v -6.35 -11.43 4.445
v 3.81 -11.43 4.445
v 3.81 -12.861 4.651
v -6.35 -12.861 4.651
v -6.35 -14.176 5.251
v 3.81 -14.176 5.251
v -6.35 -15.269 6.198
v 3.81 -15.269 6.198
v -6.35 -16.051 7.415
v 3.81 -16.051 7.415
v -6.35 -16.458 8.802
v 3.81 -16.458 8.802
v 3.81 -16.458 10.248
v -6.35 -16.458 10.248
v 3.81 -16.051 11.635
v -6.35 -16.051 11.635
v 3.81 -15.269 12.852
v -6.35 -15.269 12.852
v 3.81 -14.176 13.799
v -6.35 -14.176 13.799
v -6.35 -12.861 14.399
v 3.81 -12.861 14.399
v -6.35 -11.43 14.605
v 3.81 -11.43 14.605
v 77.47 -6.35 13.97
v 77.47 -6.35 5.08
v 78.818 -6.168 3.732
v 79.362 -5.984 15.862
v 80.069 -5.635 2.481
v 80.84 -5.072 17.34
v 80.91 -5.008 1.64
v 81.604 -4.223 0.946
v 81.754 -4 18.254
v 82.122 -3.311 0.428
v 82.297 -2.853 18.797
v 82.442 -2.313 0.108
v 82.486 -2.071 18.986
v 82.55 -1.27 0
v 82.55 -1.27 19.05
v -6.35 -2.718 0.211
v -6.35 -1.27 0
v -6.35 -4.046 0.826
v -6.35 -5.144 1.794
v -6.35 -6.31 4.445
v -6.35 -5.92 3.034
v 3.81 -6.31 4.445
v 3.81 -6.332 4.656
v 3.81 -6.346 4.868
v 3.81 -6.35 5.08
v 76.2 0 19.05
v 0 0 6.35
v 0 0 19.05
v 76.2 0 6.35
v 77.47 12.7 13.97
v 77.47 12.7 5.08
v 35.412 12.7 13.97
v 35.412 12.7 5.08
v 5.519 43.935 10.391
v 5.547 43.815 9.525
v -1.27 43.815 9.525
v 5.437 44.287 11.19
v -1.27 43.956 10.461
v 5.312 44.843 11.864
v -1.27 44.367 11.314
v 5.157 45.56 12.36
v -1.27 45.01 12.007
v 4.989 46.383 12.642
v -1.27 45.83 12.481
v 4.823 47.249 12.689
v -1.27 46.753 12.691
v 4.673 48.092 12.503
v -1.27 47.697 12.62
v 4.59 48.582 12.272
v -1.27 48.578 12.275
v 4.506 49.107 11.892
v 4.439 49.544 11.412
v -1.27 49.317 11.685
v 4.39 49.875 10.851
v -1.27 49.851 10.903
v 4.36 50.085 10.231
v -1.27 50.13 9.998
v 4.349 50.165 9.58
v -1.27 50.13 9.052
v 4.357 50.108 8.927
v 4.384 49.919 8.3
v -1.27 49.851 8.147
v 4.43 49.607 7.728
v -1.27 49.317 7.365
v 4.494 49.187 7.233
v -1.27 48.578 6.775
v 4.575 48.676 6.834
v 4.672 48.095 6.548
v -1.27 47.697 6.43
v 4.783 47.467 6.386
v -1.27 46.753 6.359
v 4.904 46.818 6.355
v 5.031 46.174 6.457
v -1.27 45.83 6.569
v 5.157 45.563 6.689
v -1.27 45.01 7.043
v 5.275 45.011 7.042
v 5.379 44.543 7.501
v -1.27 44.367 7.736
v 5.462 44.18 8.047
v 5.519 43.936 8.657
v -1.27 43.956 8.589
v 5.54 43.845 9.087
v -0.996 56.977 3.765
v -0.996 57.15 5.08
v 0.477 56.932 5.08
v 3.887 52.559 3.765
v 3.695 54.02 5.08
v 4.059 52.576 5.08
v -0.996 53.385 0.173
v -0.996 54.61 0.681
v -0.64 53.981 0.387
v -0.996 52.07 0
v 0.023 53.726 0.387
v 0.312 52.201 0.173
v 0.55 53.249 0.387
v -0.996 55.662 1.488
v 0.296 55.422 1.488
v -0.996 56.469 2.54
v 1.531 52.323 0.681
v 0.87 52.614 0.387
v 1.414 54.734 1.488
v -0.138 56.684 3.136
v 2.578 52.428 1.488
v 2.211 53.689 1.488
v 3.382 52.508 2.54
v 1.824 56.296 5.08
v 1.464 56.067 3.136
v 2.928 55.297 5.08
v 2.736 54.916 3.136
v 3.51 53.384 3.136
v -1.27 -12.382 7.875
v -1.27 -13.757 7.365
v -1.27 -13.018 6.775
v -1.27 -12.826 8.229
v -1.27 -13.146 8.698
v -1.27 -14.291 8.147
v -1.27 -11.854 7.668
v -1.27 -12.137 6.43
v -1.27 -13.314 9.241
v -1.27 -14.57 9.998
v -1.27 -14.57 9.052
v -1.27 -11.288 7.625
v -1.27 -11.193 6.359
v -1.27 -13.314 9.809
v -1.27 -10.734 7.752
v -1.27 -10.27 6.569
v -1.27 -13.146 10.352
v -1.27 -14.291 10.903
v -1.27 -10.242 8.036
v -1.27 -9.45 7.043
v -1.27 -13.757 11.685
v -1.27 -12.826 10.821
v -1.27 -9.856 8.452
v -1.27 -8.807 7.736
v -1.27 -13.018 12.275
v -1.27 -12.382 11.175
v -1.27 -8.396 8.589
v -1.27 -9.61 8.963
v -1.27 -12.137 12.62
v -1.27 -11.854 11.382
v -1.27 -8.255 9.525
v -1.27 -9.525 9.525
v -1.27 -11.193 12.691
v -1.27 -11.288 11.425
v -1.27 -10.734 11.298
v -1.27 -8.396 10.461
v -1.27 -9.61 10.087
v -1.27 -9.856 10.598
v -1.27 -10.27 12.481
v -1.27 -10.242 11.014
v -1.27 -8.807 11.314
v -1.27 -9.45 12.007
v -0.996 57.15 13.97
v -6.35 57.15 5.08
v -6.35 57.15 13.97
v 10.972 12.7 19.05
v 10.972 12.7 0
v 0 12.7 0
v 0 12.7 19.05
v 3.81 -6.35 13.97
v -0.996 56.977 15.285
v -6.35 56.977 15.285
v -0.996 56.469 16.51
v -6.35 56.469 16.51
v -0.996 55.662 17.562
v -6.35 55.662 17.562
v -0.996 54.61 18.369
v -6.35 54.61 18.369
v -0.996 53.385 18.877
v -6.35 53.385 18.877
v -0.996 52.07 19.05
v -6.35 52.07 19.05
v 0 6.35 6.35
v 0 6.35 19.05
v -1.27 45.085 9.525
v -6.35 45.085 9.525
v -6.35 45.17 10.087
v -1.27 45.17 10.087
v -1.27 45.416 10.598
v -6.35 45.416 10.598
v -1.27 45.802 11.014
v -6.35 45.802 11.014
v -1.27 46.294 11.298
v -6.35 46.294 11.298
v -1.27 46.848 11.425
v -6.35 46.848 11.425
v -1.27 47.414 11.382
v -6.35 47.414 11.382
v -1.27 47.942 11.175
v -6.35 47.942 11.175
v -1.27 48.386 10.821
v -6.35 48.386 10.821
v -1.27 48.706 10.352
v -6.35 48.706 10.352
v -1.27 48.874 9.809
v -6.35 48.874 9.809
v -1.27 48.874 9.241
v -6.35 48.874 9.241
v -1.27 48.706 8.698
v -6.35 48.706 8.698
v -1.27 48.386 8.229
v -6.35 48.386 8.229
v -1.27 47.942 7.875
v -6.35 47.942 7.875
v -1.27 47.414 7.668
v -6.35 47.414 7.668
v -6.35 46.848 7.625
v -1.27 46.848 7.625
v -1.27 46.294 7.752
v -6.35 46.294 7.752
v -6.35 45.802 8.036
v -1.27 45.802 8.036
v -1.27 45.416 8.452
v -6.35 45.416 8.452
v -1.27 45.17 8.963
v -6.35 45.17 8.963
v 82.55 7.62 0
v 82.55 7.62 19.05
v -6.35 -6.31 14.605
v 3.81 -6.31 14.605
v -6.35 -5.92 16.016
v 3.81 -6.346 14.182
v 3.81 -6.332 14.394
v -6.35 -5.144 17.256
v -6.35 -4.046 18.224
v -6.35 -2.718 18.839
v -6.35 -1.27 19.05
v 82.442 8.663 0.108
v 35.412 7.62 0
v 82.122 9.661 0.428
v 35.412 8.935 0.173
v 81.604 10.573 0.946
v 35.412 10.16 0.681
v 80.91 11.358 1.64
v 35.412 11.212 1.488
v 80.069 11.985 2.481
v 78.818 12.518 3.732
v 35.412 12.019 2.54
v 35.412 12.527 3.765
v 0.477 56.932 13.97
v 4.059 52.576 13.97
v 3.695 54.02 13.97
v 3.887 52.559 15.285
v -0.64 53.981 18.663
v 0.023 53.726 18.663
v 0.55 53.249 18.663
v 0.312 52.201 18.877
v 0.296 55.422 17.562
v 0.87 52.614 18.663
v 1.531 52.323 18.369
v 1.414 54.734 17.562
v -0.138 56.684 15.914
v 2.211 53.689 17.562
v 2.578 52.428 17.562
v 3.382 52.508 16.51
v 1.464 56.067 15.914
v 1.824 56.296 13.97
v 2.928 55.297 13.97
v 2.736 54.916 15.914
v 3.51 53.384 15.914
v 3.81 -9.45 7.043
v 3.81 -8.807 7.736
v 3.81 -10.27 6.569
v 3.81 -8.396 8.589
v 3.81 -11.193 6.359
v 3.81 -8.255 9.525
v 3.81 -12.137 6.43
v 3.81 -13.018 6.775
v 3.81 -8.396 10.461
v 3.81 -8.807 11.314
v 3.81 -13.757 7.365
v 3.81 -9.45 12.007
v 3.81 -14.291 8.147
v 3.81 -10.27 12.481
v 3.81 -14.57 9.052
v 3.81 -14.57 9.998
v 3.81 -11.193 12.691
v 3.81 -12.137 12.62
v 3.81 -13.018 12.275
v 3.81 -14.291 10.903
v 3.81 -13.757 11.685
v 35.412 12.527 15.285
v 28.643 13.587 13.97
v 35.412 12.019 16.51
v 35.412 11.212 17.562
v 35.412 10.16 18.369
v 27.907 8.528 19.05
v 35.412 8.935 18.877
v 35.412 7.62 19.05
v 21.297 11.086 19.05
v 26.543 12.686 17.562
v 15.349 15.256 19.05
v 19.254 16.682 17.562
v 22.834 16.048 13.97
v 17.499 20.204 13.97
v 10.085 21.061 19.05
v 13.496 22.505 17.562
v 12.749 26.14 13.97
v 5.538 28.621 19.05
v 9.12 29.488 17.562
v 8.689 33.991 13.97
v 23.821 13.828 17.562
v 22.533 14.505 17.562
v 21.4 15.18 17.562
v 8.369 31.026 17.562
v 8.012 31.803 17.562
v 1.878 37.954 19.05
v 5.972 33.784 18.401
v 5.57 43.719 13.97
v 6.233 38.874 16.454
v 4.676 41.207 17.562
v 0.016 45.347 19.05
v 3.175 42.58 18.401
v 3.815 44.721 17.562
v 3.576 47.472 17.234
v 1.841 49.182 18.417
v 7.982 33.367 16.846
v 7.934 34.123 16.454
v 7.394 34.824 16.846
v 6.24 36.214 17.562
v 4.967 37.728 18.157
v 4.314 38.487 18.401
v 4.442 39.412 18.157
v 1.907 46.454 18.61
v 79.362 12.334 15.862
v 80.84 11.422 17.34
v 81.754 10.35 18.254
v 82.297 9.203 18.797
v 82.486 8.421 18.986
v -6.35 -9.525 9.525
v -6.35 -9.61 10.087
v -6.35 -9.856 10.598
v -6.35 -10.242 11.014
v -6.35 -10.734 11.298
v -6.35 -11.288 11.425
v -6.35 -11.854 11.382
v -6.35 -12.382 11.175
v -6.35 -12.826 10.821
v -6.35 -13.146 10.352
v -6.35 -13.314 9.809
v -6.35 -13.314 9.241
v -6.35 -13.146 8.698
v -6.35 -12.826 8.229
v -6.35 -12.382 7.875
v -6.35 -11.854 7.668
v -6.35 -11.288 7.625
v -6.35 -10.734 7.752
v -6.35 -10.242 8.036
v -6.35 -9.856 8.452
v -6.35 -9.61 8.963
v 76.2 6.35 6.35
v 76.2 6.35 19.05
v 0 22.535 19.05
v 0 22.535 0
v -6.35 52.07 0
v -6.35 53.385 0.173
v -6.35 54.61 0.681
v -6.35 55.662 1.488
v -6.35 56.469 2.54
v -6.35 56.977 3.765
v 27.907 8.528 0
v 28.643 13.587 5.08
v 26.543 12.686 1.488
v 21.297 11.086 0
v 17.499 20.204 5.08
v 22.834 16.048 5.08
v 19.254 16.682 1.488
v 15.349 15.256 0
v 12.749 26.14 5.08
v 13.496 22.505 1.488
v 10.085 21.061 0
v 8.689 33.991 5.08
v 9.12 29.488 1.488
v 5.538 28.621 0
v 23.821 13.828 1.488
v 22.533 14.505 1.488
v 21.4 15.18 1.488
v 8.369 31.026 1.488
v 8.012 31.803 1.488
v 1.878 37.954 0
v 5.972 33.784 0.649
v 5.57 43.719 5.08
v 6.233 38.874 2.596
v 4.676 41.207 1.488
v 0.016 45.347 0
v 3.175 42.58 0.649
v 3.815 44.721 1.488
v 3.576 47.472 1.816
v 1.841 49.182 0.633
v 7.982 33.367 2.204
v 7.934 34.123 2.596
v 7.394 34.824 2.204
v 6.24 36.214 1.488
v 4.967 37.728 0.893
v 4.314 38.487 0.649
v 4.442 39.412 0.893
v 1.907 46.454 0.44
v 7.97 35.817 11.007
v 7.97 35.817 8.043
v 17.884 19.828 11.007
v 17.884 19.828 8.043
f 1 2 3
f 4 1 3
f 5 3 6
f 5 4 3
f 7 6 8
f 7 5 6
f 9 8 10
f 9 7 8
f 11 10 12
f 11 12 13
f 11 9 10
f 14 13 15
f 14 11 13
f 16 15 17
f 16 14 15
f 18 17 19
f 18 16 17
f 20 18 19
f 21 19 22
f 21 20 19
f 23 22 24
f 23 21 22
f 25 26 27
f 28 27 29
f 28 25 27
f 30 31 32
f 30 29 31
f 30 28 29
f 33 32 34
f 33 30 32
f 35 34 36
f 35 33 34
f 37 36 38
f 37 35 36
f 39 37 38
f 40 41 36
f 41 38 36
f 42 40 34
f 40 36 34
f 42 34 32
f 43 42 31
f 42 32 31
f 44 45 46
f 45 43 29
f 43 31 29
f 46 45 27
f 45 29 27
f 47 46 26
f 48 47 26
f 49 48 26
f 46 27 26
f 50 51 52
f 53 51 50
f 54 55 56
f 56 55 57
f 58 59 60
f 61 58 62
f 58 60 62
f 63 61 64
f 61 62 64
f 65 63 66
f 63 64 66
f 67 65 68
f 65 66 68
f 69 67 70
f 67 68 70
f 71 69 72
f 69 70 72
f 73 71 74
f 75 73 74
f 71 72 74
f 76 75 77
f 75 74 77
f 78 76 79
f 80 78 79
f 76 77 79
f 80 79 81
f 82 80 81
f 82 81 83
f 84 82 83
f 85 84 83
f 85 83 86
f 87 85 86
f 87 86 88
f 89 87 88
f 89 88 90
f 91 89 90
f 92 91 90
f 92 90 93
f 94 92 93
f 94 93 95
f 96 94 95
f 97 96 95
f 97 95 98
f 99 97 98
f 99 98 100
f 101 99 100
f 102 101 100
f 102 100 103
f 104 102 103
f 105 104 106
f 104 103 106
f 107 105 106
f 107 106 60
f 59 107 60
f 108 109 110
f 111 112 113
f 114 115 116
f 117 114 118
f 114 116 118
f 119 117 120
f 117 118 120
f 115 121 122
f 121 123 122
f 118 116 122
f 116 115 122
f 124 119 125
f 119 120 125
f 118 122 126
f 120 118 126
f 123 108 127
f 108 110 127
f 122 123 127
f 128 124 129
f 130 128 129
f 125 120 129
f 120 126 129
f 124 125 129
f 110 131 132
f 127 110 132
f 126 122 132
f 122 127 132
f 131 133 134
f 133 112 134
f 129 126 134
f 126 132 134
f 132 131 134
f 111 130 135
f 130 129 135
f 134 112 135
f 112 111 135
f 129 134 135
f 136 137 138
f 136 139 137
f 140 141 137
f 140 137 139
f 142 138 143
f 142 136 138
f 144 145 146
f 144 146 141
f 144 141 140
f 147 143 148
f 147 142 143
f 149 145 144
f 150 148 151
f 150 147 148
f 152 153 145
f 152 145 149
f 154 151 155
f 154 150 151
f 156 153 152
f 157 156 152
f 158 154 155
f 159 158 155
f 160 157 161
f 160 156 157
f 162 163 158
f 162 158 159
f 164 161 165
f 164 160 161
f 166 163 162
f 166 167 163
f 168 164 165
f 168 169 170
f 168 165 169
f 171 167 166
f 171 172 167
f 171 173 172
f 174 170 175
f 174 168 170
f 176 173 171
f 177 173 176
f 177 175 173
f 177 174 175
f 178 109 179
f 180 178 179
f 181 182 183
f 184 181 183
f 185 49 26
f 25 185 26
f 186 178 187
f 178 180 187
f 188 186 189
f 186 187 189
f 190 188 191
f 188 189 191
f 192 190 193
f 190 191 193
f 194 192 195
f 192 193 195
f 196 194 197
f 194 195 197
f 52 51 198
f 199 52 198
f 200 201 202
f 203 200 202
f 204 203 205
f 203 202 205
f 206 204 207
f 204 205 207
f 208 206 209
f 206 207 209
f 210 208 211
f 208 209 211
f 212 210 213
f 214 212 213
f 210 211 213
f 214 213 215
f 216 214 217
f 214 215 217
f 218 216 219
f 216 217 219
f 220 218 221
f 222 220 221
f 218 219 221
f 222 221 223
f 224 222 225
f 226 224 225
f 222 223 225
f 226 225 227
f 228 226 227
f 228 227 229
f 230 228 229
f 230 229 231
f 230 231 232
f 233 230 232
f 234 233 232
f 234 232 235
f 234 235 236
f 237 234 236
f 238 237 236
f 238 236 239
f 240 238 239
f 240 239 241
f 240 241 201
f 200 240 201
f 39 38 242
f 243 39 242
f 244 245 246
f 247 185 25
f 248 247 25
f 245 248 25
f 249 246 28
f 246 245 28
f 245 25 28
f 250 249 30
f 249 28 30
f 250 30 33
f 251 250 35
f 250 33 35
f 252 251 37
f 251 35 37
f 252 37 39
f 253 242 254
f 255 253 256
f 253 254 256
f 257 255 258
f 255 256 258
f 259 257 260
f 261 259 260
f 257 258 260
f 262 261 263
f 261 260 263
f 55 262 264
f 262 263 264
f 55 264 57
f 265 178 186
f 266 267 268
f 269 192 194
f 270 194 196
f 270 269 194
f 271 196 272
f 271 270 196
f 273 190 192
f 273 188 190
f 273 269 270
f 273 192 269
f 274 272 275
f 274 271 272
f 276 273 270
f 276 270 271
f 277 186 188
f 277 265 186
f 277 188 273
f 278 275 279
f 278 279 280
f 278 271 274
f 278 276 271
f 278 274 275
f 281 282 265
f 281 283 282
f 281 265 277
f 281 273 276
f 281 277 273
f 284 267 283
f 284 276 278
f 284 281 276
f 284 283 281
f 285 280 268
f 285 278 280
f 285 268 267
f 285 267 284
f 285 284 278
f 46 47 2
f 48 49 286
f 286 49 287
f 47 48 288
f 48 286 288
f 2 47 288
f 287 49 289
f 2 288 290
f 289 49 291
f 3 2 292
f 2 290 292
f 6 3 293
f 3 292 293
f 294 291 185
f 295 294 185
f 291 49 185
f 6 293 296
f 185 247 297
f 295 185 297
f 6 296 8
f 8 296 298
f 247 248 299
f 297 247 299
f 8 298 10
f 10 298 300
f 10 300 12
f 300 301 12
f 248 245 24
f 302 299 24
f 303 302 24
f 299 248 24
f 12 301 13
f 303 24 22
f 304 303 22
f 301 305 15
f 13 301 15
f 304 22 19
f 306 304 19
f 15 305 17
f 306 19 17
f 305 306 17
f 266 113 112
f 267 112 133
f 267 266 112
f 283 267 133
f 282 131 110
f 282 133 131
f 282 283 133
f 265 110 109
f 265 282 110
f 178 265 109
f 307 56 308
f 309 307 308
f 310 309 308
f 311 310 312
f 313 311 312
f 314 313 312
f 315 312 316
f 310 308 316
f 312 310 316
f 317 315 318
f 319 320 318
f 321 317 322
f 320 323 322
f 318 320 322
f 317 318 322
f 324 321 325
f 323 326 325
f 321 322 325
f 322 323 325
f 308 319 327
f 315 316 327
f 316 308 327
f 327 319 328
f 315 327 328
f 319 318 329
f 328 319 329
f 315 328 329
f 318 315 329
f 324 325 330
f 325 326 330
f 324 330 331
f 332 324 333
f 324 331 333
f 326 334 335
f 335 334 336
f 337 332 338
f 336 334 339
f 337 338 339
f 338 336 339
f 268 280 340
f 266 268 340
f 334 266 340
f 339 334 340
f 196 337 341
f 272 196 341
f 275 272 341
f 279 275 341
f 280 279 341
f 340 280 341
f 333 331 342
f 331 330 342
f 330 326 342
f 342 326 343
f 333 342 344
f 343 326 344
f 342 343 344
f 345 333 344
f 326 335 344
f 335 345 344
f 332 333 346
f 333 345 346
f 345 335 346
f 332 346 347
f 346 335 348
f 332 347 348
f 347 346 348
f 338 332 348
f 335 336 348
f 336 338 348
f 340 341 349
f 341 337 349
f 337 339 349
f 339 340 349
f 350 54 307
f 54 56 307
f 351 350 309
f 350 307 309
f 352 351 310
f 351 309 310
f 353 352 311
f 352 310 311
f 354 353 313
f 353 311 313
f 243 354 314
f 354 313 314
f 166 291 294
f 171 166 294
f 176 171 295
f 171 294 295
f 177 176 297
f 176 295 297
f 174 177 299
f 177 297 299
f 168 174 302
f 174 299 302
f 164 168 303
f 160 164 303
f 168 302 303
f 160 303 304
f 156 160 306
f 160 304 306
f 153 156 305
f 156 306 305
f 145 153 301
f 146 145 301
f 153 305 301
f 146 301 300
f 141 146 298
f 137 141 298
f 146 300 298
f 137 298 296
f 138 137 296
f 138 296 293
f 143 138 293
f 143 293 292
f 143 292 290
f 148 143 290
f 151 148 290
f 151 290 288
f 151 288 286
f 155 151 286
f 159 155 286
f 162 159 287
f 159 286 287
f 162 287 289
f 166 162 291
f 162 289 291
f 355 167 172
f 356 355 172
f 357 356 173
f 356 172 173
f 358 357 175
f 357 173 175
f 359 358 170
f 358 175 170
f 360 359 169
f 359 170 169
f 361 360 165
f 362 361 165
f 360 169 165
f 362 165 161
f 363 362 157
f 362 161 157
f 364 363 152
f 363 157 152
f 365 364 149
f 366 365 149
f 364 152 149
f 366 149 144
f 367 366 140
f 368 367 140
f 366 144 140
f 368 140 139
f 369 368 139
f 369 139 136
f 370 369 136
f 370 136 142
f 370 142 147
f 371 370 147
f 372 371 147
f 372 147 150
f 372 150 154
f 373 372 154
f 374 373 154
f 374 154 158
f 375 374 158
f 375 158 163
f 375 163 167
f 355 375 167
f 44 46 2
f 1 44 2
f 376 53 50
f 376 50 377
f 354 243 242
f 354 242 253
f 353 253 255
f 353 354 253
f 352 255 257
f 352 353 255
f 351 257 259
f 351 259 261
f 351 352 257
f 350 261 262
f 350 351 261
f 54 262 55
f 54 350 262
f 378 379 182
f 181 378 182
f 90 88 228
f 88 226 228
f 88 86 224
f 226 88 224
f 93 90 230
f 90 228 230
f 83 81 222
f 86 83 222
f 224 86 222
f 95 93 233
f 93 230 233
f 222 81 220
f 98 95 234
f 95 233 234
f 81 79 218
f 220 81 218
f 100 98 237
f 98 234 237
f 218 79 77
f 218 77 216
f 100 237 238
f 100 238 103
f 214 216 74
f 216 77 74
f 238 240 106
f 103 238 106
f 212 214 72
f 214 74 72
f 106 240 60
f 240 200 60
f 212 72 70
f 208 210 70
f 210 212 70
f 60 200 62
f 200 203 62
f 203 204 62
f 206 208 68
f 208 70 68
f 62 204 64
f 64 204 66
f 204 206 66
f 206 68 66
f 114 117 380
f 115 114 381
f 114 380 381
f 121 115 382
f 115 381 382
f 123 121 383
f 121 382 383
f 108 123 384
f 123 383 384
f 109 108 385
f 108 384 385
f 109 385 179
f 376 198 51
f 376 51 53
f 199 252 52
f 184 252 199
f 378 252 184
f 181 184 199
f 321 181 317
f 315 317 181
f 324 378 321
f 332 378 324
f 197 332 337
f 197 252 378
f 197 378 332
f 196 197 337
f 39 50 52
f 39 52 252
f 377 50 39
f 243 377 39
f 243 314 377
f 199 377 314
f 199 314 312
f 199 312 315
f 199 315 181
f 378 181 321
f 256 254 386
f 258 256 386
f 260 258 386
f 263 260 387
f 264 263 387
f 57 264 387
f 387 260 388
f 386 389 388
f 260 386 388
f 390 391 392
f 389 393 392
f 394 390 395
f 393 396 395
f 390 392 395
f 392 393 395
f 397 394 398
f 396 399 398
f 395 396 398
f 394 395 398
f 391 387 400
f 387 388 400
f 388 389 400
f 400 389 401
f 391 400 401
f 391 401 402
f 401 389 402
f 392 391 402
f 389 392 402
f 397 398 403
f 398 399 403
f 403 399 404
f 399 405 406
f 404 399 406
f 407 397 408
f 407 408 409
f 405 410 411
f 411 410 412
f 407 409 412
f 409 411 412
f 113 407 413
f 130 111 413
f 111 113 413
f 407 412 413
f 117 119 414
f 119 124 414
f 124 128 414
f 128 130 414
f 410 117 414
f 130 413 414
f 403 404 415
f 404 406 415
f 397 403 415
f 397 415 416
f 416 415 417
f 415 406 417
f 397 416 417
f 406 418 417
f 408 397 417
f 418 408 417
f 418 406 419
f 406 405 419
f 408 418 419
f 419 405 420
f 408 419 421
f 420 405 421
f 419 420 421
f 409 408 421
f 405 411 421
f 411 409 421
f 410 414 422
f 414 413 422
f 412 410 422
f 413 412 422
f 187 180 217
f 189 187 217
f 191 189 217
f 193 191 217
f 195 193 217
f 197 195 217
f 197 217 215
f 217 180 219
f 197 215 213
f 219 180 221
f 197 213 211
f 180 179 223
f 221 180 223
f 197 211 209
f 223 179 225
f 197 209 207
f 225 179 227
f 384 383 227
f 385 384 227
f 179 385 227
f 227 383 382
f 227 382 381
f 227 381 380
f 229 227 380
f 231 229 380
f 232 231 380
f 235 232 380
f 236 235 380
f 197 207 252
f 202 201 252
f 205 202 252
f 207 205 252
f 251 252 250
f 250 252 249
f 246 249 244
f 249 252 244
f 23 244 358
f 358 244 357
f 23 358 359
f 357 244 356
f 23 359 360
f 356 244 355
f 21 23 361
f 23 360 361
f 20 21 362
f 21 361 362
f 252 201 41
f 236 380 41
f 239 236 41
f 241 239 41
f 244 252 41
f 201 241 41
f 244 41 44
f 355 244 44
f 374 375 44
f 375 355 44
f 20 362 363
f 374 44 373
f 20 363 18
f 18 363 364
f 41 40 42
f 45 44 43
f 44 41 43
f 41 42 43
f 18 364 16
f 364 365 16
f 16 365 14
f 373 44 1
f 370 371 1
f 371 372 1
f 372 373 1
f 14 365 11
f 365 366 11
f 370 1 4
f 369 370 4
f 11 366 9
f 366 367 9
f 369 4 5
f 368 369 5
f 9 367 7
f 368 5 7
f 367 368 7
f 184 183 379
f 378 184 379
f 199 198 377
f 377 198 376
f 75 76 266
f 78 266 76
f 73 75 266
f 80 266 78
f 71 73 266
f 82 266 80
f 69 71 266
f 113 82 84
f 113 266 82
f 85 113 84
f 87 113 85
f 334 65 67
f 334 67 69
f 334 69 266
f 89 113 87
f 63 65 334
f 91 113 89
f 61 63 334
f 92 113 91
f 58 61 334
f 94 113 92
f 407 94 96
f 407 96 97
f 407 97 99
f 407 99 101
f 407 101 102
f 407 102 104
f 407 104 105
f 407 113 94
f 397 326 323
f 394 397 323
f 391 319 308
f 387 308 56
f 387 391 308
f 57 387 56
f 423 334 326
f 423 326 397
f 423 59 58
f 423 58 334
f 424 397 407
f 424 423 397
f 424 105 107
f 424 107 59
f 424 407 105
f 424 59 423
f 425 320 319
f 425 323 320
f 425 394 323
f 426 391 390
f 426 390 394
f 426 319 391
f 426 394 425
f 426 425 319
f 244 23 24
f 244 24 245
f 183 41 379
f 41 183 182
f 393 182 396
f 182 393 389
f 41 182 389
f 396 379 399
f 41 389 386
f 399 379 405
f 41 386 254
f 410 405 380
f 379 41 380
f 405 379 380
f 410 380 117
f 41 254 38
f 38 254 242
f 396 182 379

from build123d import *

# Parameters (mm, degrees)
F0_W      = 76.2
F0_H      = 6.35
F1_DEPTH  = 19.05
F2_DEPTH  = 6.35
F4_START  = -5.08
F3_R      = 3.175
F3_R_2    = 1.905
F4_DEPTH  = 6.8182960521
F6_DEPTH  = 10.16
F7_R      = 3.175
F7_R_2    = 1.905
F8_DEPTH  = 5.08
F9_DEPTH  = 10.1610001
F10_DEPTH = 88.9010001
F11_R     = 5.08


with BuildPart() as f1:
    # F0 (on Top) → F1 (new body)
    with BuildSketch(Plane.XY):
        with BuildLine():
            Line((-6.35, -6.35), (82.55, -6.35))
            Line((82.55, -6.35), (82.55, 12.7))
            Line((82.55, 12.7), (35.4121256149, 12.7))
            add(Edge.make_bspline(
                [(3.81, 57.15), (3.81, 44.45), (10.9720126255, 12.7), (35.4121256149, 12.7)],
                knots=[0, 0, 0, 0, 54.538947949, 54.538947949, 54.538947949, 54.538947949], degree=3))
            Line((3.81, 57.15), (-6.35, 57.15))
            Line((-6.35, 57.15), (-6.35, 12.7))
            Line((-6.35, 12.7), (-6.35, -6.35))
        make_face()
        Polygon((0, 12.7), (0, 22.5350875407), (10.9720126255, 12.7), align=None, mode=Mode.SUBTRACT)
        with Locations((38.1, 3.175)):
            Rectangle(F0_W, F0_H, mode=Mode.SUBTRACT)
    extrude(amount=F1_DEPTH)

    # F0 (on Top) → F2 (join)
    with BuildSketch(Plane.XY):
        with Locations((38.1, 3.175)):
            Rectangle(F0_W, F0_H)
    extrude(amount=F2_DEPTH)

    # F3 (on face) → F4 (cut)
    with BuildSketch(Plane(origin=(-6.35, 0, 0), x_dir=(0, -1, 0), z_dir=(-1, 0, 0)).offset(F4_START)):
        with Locations((-46.99, 9.525)):
            Circle(F3_R)
        with Locations((-46.99, 9.525)):
            Circle(F3_R_2, mode=Mode.SUBTRACT)
    extrude(amount=-F4_DEPTH, mode=Mode.SUBTRACT)

    # F5 (on face) → F6 (join)
    with BuildSketch(Plane(origin=(-6.35, 0, 0), x_dir=(0, -1, 0), z_dir=(-1, 0, 0))):
        with BuildLine():
            Line((11.43, 14.605), (6.35, 14.605))
            Line((6.35, 14.605), (6.35, 4.445))
            Line((6.35, 4.445), (11.43, 4.445))
            ThreePointArc((11.43, 4.445), (16.51, 9.525), (11.43, 14.605))
        make_face()
    extrude(amount=-F6_DEPTH)

    # F7 (on face) → F8 (cut)
    with BuildSketch(Plane.YZ.offset(3.81)):
        with Locations((-11.43, 9.525)):
            Circle(F7_R)
        with Locations((-11.43, 9.525)):
            Circle(F7_R_2, mode=Mode.SUBTRACT)
    extrude(amount=-F8_DEPTH, mode=Mode.SUBTRACT)

    # F7 (on face) → F9 (cut, through all)
    with BuildSketch(Plane.YZ.offset(3.81)):
        with Locations((-11.43, 9.525)):
            Circle(F7_R_2)
    extrude(amount=-F9_DEPTH, mode=Mode.SUBTRACT)

    # F3 (on face) → F10 (cut, through all)
    with BuildSketch(Plane(origin=(-6.35, 0, 0), x_dir=(0, -1, 0), z_dir=(-1, 0, 0))):
        with Locations((-46.99, 9.525)):
            Circle(F3_R_2)
    extrude(amount=-F10_DEPTH, mode=Mode.SUBTRACT)

    # F11
    f11_edges = [f1.edges().sort_by_distance(p)[0] for p in [
        (58.981063, 12.7, 0),
        (58.981063, 12.7, 19.05),
        (38.1, -6.35, 19.05),
        (38.1, -6.35, 0),
        (82.55, -6.35, 9.525),
        (82.55, 12.7, 9.525),
        (3.81, 57.15, 9.525),
        (-1.27, 57.15, 19.05),
        (-1.27, 57.15, 0),
    ]]
    fillet(f11_edges, radius=F11_R)


solid = f1.part
